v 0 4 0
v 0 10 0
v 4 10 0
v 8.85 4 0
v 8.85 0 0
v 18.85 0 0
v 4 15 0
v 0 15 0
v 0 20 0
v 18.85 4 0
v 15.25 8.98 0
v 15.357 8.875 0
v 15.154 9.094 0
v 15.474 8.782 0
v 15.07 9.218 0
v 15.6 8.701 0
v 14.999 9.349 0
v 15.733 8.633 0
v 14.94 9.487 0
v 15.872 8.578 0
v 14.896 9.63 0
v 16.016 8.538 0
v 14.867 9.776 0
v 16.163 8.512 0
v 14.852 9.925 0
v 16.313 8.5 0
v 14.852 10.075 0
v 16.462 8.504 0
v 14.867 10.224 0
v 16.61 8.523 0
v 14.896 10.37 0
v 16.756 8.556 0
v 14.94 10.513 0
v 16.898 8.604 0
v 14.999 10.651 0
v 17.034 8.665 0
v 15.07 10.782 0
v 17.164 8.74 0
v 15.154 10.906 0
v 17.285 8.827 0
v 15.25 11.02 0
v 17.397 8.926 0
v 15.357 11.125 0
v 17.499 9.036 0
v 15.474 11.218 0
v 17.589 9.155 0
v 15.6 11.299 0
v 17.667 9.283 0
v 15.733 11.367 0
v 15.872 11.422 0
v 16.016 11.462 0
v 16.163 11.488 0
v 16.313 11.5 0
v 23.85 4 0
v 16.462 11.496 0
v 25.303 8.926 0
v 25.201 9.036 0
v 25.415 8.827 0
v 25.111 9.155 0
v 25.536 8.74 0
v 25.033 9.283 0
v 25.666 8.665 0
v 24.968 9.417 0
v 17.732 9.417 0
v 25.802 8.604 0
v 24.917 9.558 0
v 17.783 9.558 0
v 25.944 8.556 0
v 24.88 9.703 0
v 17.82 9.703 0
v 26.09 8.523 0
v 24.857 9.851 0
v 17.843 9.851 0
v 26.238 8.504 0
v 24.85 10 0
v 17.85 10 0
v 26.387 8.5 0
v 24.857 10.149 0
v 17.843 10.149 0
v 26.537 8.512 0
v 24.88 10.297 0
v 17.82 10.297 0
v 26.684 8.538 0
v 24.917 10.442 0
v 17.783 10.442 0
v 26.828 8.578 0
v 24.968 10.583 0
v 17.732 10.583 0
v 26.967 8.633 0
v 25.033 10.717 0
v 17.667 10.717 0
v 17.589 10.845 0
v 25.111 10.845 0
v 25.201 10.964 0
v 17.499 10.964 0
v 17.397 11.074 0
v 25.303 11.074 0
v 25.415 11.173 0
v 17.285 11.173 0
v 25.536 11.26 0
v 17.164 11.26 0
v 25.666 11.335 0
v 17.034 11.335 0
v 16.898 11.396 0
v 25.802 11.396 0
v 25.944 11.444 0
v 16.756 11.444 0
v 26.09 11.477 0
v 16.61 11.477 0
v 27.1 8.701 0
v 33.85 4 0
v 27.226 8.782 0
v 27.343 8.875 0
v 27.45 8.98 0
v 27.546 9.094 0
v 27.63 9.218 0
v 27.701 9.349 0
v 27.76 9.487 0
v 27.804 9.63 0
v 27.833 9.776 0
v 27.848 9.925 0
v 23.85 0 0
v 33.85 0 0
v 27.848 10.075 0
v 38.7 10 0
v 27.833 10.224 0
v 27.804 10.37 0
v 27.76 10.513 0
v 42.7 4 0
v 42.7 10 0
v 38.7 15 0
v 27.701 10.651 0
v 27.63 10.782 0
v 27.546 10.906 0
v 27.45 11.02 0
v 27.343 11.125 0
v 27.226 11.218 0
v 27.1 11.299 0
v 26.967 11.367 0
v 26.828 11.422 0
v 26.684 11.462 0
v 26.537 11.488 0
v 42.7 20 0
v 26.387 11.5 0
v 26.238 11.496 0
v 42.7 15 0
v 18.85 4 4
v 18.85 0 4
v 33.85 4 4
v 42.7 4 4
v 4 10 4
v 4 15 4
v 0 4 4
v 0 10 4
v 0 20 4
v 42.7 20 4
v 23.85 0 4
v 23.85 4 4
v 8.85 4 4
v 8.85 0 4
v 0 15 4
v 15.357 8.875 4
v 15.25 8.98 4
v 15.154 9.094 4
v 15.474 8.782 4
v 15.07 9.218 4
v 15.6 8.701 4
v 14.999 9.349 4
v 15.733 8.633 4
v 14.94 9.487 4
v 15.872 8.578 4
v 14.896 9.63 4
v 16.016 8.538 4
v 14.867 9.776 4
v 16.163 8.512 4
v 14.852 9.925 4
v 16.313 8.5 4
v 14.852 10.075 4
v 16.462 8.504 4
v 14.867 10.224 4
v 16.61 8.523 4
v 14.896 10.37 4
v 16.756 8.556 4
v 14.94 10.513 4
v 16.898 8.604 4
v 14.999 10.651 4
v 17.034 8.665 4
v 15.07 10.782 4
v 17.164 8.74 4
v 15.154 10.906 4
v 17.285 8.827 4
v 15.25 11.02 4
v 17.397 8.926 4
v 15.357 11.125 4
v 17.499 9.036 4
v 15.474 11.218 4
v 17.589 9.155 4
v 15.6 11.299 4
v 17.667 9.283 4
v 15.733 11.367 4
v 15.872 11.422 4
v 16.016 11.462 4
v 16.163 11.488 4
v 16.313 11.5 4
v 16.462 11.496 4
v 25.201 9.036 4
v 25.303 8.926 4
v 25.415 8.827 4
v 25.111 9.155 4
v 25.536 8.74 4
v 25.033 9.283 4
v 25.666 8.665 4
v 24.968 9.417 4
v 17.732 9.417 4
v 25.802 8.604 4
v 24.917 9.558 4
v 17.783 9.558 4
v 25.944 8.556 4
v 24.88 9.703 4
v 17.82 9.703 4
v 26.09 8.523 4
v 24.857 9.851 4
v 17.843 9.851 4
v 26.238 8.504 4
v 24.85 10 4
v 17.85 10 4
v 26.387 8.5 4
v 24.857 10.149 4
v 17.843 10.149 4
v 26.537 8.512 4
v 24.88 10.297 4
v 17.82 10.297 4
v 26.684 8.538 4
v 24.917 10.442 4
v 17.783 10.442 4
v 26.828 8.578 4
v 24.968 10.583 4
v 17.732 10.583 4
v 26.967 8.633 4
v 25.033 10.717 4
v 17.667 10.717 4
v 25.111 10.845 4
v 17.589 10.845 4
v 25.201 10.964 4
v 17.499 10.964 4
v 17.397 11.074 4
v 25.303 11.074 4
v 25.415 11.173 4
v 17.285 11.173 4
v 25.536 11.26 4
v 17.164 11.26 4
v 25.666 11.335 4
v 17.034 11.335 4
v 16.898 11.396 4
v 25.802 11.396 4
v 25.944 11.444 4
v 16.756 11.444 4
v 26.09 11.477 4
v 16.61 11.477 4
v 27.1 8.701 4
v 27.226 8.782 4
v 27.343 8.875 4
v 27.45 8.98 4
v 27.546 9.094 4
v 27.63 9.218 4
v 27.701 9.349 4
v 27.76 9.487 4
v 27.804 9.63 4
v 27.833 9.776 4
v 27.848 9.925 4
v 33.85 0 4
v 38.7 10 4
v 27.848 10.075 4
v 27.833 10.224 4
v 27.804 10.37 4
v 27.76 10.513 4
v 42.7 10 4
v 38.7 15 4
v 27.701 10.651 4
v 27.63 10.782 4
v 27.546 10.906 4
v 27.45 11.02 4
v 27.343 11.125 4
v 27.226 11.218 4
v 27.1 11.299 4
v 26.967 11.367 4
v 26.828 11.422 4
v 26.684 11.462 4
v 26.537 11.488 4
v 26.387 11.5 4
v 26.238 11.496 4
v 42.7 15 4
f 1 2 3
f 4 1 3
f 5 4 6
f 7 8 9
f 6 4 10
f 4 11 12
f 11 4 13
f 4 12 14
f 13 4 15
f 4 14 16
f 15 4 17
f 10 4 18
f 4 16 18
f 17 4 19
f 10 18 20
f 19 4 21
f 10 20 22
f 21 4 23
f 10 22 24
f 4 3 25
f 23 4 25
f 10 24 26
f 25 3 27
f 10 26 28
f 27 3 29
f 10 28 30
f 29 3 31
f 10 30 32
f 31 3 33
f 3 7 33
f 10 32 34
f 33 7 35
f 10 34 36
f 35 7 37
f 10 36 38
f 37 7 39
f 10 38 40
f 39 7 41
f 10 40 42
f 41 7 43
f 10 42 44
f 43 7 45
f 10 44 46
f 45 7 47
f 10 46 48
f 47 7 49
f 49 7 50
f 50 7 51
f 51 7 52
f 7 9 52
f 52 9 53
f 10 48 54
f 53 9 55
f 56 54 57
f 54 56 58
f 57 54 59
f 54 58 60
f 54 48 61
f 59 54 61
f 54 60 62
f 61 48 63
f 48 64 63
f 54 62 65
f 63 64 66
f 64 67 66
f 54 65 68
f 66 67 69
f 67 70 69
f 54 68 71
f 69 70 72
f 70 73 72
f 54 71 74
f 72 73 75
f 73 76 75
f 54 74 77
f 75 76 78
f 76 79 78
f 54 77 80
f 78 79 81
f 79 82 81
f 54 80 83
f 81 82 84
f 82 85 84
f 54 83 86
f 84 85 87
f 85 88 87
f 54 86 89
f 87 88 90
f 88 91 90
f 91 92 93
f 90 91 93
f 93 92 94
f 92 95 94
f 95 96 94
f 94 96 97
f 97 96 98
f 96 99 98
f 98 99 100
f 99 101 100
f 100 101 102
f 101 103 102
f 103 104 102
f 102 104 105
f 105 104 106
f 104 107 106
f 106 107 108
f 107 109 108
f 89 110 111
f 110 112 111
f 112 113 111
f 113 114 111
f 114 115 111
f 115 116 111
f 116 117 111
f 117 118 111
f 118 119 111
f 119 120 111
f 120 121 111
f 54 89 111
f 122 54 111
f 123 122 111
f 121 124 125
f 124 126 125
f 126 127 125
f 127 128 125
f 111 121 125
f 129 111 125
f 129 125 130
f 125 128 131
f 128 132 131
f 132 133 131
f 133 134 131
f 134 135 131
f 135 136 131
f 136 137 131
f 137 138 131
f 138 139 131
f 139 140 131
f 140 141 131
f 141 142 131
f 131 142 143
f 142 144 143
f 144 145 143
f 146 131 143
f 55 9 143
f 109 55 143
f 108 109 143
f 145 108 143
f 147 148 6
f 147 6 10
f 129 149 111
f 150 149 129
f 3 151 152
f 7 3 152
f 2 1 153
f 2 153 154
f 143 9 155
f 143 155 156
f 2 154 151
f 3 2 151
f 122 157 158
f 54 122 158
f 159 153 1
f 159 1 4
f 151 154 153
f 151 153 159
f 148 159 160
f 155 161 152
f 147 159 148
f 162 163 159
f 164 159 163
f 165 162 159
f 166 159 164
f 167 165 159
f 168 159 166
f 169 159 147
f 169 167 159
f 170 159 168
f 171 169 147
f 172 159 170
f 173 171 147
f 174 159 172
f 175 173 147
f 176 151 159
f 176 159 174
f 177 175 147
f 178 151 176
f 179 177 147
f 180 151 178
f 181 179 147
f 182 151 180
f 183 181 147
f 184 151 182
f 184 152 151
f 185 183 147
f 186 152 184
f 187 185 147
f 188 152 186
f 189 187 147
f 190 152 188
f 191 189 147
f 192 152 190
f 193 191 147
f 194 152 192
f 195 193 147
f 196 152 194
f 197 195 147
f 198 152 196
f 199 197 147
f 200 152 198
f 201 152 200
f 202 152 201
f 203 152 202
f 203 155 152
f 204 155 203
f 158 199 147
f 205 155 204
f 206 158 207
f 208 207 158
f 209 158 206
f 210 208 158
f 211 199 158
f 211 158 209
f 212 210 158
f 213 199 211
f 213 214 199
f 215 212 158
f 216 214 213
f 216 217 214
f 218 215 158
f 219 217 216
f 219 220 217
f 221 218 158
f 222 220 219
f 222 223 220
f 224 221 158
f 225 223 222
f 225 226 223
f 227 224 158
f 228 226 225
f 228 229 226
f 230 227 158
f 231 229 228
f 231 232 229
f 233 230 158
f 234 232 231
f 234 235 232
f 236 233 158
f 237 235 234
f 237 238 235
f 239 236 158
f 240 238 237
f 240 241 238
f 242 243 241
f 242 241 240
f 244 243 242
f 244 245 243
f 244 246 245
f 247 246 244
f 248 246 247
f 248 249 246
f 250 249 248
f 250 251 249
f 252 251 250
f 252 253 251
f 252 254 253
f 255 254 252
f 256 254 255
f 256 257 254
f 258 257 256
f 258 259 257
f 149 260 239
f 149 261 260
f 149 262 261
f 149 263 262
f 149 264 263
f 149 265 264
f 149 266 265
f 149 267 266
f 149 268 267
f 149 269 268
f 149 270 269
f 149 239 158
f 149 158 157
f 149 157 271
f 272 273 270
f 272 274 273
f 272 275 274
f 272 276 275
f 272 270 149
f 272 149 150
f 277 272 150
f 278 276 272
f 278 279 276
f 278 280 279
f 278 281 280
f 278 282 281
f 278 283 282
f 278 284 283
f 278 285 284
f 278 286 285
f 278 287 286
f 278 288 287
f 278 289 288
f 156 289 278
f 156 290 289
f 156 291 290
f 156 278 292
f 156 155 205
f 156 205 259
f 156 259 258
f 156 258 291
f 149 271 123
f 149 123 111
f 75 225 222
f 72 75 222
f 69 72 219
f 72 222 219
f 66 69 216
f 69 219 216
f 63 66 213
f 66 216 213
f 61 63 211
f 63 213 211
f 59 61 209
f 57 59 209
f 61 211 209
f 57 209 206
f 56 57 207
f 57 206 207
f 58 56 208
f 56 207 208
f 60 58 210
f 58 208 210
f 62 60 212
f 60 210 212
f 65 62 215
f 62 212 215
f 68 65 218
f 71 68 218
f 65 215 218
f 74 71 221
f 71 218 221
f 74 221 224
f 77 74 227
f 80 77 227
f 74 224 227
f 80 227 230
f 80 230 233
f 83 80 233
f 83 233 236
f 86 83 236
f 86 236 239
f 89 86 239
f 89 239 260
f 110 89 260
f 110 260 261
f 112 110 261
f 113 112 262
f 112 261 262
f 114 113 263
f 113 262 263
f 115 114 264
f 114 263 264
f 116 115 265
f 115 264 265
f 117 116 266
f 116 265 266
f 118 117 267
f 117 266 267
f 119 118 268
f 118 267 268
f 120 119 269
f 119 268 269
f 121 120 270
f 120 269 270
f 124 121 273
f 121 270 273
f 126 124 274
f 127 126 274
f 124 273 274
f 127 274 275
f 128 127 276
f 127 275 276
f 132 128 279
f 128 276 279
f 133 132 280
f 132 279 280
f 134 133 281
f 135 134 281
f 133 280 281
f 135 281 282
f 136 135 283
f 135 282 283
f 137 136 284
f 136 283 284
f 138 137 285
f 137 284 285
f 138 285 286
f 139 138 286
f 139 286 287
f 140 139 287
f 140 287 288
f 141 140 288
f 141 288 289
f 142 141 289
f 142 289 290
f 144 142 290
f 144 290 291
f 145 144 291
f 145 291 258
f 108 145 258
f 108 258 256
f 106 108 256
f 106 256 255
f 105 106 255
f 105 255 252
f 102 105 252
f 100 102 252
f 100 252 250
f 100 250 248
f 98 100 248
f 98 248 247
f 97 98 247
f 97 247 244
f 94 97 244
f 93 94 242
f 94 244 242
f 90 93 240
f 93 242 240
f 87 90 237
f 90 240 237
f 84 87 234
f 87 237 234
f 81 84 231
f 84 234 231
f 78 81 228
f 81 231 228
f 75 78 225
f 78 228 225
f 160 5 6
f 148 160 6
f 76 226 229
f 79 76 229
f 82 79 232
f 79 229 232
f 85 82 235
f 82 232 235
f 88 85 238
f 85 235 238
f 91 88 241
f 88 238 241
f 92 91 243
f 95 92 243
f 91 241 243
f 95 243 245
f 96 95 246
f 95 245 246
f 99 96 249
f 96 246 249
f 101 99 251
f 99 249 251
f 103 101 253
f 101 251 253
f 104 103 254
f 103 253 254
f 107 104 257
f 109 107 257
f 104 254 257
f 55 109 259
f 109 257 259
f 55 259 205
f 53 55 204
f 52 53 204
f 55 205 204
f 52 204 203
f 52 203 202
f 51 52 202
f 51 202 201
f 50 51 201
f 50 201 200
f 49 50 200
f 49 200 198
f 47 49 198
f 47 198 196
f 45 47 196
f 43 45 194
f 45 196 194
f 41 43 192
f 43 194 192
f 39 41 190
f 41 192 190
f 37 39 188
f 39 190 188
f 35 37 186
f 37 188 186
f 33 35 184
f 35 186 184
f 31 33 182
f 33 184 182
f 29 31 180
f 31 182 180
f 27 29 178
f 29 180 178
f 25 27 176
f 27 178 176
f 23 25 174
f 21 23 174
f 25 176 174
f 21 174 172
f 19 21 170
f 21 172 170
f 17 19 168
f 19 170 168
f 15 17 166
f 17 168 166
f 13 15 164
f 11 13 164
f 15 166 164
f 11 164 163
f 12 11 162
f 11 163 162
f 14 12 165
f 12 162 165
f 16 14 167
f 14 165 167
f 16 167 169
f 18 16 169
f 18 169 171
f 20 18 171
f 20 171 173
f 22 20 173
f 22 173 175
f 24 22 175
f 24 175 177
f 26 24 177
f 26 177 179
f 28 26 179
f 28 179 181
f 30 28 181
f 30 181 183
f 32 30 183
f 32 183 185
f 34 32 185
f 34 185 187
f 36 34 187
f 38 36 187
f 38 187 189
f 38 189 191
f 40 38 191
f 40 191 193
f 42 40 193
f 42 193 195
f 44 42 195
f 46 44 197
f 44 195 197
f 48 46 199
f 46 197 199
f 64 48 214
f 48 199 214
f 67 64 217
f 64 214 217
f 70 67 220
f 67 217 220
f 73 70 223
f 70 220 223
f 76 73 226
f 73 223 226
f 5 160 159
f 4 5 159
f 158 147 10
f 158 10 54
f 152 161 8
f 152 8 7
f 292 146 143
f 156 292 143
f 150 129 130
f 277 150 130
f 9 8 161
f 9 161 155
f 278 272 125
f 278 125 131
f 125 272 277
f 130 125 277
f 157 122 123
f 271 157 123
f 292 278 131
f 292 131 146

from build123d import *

# Parameters (mm, degrees)
SKETCH_1_W          = 42.7
SKETCH_1_H          = 20
EXTRUDE_1_DEPTH     = 4
SKETCH_2_R          = 1.5
SKETCH_2_W          = 8.85
SKETCH_2_H          = 4
SKETCH_2_W_2        = 5
SKETCH_2_W_3        = 4
SKETCH_2_H_2        = 5
CUT_EXTRUDE_1_DEPTH = 4


with BuildPart() as part:
    # Эскиз1 → Бобышка-Вытянуть1 (new body)
    with BuildSketch(Plane.XY):
        with Locations((21.35, 10)):
            Rectangle(SKETCH_1_W, SKETCH_1_H)
    extrude(amount=EXTRUDE_1_DEPTH)

    # Эскиз2 → Вырез-Вытянуть1 (cut)
    with BuildSketch(Plane.XY.offset(4)):
        with Locations((16.35, 10)):
            Circle(SKETCH_2_R)
        with Locations(Location((26.35, 10, 0), (0, 0, 180))):
            Circle(SKETCH_2_R)
        with Locations((4.425, 2)):
            Rectangle(SKETCH_2_W, SKETCH_2_H)
        with Locations((21.35, 2)):
            Rectangle(SKETCH_2_W_2, SKETCH_2_H)
        with Locations((38.275, 2)):
            Rectangle(SKETCH_2_W, SKETCH_2_H)
        with Locations((2, 12.5)):
            Rectangle(SKETCH_2_W_3, SKETCH_2_H_2)
        with Locations((40.7, 12.5)):
            Rectangle(SKETCH_2_W_3, SKETCH_2_H_2)
    extrude(amount=-CUT_EXTRUDE_1_DEPTH, mode=Mode.SUBTRACT)


solid = part.part
